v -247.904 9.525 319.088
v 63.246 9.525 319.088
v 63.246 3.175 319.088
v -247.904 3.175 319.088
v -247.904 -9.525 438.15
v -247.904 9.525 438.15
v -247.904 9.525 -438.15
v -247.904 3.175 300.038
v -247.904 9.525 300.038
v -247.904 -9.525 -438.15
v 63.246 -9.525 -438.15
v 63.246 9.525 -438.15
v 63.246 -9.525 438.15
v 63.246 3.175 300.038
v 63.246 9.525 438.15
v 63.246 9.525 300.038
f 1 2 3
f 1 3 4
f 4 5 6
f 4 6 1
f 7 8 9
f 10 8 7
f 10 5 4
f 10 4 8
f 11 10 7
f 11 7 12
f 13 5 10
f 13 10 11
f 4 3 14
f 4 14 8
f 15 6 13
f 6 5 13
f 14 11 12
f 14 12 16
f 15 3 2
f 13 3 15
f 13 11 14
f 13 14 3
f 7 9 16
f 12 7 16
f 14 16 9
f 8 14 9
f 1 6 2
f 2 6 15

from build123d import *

# Parameters (mm, degrees)
F0_W     = 311.15
F0_H     = 438.15
F1_DEPTH = 9.525
F2_W     = 311.15
F2_H     = 19.05
F3_DEPTH = 6.35


with BuildPart() as f1:
    # F0 (on Front) → F1 (new body, symmetric)
    with BuildSketch(Plane.XZ):
        with Locations((-92.3289953259, 219.075)):
            Rectangle(F0_W, F0_H)
        with Locations((-92.3289953259, -219.075)):
            Rectangle(F0_W, F0_H)
    extrude(amount=F1_DEPTH, both=True)

    # F2 (on face) → F3 (cut)
    with BuildSketch(Plane(origin=(0, 9.525, 0), x_dir=(-1, 0, 0), z_dir=(0, 1, 0))):
        with Locations((92.3289953259, 309.5625)):
            Rectangle(F2_W, F2_H)
    extrude(amount=-F3_DEPTH, mode=Mode.SUBTRACT)


solid = f1.part
